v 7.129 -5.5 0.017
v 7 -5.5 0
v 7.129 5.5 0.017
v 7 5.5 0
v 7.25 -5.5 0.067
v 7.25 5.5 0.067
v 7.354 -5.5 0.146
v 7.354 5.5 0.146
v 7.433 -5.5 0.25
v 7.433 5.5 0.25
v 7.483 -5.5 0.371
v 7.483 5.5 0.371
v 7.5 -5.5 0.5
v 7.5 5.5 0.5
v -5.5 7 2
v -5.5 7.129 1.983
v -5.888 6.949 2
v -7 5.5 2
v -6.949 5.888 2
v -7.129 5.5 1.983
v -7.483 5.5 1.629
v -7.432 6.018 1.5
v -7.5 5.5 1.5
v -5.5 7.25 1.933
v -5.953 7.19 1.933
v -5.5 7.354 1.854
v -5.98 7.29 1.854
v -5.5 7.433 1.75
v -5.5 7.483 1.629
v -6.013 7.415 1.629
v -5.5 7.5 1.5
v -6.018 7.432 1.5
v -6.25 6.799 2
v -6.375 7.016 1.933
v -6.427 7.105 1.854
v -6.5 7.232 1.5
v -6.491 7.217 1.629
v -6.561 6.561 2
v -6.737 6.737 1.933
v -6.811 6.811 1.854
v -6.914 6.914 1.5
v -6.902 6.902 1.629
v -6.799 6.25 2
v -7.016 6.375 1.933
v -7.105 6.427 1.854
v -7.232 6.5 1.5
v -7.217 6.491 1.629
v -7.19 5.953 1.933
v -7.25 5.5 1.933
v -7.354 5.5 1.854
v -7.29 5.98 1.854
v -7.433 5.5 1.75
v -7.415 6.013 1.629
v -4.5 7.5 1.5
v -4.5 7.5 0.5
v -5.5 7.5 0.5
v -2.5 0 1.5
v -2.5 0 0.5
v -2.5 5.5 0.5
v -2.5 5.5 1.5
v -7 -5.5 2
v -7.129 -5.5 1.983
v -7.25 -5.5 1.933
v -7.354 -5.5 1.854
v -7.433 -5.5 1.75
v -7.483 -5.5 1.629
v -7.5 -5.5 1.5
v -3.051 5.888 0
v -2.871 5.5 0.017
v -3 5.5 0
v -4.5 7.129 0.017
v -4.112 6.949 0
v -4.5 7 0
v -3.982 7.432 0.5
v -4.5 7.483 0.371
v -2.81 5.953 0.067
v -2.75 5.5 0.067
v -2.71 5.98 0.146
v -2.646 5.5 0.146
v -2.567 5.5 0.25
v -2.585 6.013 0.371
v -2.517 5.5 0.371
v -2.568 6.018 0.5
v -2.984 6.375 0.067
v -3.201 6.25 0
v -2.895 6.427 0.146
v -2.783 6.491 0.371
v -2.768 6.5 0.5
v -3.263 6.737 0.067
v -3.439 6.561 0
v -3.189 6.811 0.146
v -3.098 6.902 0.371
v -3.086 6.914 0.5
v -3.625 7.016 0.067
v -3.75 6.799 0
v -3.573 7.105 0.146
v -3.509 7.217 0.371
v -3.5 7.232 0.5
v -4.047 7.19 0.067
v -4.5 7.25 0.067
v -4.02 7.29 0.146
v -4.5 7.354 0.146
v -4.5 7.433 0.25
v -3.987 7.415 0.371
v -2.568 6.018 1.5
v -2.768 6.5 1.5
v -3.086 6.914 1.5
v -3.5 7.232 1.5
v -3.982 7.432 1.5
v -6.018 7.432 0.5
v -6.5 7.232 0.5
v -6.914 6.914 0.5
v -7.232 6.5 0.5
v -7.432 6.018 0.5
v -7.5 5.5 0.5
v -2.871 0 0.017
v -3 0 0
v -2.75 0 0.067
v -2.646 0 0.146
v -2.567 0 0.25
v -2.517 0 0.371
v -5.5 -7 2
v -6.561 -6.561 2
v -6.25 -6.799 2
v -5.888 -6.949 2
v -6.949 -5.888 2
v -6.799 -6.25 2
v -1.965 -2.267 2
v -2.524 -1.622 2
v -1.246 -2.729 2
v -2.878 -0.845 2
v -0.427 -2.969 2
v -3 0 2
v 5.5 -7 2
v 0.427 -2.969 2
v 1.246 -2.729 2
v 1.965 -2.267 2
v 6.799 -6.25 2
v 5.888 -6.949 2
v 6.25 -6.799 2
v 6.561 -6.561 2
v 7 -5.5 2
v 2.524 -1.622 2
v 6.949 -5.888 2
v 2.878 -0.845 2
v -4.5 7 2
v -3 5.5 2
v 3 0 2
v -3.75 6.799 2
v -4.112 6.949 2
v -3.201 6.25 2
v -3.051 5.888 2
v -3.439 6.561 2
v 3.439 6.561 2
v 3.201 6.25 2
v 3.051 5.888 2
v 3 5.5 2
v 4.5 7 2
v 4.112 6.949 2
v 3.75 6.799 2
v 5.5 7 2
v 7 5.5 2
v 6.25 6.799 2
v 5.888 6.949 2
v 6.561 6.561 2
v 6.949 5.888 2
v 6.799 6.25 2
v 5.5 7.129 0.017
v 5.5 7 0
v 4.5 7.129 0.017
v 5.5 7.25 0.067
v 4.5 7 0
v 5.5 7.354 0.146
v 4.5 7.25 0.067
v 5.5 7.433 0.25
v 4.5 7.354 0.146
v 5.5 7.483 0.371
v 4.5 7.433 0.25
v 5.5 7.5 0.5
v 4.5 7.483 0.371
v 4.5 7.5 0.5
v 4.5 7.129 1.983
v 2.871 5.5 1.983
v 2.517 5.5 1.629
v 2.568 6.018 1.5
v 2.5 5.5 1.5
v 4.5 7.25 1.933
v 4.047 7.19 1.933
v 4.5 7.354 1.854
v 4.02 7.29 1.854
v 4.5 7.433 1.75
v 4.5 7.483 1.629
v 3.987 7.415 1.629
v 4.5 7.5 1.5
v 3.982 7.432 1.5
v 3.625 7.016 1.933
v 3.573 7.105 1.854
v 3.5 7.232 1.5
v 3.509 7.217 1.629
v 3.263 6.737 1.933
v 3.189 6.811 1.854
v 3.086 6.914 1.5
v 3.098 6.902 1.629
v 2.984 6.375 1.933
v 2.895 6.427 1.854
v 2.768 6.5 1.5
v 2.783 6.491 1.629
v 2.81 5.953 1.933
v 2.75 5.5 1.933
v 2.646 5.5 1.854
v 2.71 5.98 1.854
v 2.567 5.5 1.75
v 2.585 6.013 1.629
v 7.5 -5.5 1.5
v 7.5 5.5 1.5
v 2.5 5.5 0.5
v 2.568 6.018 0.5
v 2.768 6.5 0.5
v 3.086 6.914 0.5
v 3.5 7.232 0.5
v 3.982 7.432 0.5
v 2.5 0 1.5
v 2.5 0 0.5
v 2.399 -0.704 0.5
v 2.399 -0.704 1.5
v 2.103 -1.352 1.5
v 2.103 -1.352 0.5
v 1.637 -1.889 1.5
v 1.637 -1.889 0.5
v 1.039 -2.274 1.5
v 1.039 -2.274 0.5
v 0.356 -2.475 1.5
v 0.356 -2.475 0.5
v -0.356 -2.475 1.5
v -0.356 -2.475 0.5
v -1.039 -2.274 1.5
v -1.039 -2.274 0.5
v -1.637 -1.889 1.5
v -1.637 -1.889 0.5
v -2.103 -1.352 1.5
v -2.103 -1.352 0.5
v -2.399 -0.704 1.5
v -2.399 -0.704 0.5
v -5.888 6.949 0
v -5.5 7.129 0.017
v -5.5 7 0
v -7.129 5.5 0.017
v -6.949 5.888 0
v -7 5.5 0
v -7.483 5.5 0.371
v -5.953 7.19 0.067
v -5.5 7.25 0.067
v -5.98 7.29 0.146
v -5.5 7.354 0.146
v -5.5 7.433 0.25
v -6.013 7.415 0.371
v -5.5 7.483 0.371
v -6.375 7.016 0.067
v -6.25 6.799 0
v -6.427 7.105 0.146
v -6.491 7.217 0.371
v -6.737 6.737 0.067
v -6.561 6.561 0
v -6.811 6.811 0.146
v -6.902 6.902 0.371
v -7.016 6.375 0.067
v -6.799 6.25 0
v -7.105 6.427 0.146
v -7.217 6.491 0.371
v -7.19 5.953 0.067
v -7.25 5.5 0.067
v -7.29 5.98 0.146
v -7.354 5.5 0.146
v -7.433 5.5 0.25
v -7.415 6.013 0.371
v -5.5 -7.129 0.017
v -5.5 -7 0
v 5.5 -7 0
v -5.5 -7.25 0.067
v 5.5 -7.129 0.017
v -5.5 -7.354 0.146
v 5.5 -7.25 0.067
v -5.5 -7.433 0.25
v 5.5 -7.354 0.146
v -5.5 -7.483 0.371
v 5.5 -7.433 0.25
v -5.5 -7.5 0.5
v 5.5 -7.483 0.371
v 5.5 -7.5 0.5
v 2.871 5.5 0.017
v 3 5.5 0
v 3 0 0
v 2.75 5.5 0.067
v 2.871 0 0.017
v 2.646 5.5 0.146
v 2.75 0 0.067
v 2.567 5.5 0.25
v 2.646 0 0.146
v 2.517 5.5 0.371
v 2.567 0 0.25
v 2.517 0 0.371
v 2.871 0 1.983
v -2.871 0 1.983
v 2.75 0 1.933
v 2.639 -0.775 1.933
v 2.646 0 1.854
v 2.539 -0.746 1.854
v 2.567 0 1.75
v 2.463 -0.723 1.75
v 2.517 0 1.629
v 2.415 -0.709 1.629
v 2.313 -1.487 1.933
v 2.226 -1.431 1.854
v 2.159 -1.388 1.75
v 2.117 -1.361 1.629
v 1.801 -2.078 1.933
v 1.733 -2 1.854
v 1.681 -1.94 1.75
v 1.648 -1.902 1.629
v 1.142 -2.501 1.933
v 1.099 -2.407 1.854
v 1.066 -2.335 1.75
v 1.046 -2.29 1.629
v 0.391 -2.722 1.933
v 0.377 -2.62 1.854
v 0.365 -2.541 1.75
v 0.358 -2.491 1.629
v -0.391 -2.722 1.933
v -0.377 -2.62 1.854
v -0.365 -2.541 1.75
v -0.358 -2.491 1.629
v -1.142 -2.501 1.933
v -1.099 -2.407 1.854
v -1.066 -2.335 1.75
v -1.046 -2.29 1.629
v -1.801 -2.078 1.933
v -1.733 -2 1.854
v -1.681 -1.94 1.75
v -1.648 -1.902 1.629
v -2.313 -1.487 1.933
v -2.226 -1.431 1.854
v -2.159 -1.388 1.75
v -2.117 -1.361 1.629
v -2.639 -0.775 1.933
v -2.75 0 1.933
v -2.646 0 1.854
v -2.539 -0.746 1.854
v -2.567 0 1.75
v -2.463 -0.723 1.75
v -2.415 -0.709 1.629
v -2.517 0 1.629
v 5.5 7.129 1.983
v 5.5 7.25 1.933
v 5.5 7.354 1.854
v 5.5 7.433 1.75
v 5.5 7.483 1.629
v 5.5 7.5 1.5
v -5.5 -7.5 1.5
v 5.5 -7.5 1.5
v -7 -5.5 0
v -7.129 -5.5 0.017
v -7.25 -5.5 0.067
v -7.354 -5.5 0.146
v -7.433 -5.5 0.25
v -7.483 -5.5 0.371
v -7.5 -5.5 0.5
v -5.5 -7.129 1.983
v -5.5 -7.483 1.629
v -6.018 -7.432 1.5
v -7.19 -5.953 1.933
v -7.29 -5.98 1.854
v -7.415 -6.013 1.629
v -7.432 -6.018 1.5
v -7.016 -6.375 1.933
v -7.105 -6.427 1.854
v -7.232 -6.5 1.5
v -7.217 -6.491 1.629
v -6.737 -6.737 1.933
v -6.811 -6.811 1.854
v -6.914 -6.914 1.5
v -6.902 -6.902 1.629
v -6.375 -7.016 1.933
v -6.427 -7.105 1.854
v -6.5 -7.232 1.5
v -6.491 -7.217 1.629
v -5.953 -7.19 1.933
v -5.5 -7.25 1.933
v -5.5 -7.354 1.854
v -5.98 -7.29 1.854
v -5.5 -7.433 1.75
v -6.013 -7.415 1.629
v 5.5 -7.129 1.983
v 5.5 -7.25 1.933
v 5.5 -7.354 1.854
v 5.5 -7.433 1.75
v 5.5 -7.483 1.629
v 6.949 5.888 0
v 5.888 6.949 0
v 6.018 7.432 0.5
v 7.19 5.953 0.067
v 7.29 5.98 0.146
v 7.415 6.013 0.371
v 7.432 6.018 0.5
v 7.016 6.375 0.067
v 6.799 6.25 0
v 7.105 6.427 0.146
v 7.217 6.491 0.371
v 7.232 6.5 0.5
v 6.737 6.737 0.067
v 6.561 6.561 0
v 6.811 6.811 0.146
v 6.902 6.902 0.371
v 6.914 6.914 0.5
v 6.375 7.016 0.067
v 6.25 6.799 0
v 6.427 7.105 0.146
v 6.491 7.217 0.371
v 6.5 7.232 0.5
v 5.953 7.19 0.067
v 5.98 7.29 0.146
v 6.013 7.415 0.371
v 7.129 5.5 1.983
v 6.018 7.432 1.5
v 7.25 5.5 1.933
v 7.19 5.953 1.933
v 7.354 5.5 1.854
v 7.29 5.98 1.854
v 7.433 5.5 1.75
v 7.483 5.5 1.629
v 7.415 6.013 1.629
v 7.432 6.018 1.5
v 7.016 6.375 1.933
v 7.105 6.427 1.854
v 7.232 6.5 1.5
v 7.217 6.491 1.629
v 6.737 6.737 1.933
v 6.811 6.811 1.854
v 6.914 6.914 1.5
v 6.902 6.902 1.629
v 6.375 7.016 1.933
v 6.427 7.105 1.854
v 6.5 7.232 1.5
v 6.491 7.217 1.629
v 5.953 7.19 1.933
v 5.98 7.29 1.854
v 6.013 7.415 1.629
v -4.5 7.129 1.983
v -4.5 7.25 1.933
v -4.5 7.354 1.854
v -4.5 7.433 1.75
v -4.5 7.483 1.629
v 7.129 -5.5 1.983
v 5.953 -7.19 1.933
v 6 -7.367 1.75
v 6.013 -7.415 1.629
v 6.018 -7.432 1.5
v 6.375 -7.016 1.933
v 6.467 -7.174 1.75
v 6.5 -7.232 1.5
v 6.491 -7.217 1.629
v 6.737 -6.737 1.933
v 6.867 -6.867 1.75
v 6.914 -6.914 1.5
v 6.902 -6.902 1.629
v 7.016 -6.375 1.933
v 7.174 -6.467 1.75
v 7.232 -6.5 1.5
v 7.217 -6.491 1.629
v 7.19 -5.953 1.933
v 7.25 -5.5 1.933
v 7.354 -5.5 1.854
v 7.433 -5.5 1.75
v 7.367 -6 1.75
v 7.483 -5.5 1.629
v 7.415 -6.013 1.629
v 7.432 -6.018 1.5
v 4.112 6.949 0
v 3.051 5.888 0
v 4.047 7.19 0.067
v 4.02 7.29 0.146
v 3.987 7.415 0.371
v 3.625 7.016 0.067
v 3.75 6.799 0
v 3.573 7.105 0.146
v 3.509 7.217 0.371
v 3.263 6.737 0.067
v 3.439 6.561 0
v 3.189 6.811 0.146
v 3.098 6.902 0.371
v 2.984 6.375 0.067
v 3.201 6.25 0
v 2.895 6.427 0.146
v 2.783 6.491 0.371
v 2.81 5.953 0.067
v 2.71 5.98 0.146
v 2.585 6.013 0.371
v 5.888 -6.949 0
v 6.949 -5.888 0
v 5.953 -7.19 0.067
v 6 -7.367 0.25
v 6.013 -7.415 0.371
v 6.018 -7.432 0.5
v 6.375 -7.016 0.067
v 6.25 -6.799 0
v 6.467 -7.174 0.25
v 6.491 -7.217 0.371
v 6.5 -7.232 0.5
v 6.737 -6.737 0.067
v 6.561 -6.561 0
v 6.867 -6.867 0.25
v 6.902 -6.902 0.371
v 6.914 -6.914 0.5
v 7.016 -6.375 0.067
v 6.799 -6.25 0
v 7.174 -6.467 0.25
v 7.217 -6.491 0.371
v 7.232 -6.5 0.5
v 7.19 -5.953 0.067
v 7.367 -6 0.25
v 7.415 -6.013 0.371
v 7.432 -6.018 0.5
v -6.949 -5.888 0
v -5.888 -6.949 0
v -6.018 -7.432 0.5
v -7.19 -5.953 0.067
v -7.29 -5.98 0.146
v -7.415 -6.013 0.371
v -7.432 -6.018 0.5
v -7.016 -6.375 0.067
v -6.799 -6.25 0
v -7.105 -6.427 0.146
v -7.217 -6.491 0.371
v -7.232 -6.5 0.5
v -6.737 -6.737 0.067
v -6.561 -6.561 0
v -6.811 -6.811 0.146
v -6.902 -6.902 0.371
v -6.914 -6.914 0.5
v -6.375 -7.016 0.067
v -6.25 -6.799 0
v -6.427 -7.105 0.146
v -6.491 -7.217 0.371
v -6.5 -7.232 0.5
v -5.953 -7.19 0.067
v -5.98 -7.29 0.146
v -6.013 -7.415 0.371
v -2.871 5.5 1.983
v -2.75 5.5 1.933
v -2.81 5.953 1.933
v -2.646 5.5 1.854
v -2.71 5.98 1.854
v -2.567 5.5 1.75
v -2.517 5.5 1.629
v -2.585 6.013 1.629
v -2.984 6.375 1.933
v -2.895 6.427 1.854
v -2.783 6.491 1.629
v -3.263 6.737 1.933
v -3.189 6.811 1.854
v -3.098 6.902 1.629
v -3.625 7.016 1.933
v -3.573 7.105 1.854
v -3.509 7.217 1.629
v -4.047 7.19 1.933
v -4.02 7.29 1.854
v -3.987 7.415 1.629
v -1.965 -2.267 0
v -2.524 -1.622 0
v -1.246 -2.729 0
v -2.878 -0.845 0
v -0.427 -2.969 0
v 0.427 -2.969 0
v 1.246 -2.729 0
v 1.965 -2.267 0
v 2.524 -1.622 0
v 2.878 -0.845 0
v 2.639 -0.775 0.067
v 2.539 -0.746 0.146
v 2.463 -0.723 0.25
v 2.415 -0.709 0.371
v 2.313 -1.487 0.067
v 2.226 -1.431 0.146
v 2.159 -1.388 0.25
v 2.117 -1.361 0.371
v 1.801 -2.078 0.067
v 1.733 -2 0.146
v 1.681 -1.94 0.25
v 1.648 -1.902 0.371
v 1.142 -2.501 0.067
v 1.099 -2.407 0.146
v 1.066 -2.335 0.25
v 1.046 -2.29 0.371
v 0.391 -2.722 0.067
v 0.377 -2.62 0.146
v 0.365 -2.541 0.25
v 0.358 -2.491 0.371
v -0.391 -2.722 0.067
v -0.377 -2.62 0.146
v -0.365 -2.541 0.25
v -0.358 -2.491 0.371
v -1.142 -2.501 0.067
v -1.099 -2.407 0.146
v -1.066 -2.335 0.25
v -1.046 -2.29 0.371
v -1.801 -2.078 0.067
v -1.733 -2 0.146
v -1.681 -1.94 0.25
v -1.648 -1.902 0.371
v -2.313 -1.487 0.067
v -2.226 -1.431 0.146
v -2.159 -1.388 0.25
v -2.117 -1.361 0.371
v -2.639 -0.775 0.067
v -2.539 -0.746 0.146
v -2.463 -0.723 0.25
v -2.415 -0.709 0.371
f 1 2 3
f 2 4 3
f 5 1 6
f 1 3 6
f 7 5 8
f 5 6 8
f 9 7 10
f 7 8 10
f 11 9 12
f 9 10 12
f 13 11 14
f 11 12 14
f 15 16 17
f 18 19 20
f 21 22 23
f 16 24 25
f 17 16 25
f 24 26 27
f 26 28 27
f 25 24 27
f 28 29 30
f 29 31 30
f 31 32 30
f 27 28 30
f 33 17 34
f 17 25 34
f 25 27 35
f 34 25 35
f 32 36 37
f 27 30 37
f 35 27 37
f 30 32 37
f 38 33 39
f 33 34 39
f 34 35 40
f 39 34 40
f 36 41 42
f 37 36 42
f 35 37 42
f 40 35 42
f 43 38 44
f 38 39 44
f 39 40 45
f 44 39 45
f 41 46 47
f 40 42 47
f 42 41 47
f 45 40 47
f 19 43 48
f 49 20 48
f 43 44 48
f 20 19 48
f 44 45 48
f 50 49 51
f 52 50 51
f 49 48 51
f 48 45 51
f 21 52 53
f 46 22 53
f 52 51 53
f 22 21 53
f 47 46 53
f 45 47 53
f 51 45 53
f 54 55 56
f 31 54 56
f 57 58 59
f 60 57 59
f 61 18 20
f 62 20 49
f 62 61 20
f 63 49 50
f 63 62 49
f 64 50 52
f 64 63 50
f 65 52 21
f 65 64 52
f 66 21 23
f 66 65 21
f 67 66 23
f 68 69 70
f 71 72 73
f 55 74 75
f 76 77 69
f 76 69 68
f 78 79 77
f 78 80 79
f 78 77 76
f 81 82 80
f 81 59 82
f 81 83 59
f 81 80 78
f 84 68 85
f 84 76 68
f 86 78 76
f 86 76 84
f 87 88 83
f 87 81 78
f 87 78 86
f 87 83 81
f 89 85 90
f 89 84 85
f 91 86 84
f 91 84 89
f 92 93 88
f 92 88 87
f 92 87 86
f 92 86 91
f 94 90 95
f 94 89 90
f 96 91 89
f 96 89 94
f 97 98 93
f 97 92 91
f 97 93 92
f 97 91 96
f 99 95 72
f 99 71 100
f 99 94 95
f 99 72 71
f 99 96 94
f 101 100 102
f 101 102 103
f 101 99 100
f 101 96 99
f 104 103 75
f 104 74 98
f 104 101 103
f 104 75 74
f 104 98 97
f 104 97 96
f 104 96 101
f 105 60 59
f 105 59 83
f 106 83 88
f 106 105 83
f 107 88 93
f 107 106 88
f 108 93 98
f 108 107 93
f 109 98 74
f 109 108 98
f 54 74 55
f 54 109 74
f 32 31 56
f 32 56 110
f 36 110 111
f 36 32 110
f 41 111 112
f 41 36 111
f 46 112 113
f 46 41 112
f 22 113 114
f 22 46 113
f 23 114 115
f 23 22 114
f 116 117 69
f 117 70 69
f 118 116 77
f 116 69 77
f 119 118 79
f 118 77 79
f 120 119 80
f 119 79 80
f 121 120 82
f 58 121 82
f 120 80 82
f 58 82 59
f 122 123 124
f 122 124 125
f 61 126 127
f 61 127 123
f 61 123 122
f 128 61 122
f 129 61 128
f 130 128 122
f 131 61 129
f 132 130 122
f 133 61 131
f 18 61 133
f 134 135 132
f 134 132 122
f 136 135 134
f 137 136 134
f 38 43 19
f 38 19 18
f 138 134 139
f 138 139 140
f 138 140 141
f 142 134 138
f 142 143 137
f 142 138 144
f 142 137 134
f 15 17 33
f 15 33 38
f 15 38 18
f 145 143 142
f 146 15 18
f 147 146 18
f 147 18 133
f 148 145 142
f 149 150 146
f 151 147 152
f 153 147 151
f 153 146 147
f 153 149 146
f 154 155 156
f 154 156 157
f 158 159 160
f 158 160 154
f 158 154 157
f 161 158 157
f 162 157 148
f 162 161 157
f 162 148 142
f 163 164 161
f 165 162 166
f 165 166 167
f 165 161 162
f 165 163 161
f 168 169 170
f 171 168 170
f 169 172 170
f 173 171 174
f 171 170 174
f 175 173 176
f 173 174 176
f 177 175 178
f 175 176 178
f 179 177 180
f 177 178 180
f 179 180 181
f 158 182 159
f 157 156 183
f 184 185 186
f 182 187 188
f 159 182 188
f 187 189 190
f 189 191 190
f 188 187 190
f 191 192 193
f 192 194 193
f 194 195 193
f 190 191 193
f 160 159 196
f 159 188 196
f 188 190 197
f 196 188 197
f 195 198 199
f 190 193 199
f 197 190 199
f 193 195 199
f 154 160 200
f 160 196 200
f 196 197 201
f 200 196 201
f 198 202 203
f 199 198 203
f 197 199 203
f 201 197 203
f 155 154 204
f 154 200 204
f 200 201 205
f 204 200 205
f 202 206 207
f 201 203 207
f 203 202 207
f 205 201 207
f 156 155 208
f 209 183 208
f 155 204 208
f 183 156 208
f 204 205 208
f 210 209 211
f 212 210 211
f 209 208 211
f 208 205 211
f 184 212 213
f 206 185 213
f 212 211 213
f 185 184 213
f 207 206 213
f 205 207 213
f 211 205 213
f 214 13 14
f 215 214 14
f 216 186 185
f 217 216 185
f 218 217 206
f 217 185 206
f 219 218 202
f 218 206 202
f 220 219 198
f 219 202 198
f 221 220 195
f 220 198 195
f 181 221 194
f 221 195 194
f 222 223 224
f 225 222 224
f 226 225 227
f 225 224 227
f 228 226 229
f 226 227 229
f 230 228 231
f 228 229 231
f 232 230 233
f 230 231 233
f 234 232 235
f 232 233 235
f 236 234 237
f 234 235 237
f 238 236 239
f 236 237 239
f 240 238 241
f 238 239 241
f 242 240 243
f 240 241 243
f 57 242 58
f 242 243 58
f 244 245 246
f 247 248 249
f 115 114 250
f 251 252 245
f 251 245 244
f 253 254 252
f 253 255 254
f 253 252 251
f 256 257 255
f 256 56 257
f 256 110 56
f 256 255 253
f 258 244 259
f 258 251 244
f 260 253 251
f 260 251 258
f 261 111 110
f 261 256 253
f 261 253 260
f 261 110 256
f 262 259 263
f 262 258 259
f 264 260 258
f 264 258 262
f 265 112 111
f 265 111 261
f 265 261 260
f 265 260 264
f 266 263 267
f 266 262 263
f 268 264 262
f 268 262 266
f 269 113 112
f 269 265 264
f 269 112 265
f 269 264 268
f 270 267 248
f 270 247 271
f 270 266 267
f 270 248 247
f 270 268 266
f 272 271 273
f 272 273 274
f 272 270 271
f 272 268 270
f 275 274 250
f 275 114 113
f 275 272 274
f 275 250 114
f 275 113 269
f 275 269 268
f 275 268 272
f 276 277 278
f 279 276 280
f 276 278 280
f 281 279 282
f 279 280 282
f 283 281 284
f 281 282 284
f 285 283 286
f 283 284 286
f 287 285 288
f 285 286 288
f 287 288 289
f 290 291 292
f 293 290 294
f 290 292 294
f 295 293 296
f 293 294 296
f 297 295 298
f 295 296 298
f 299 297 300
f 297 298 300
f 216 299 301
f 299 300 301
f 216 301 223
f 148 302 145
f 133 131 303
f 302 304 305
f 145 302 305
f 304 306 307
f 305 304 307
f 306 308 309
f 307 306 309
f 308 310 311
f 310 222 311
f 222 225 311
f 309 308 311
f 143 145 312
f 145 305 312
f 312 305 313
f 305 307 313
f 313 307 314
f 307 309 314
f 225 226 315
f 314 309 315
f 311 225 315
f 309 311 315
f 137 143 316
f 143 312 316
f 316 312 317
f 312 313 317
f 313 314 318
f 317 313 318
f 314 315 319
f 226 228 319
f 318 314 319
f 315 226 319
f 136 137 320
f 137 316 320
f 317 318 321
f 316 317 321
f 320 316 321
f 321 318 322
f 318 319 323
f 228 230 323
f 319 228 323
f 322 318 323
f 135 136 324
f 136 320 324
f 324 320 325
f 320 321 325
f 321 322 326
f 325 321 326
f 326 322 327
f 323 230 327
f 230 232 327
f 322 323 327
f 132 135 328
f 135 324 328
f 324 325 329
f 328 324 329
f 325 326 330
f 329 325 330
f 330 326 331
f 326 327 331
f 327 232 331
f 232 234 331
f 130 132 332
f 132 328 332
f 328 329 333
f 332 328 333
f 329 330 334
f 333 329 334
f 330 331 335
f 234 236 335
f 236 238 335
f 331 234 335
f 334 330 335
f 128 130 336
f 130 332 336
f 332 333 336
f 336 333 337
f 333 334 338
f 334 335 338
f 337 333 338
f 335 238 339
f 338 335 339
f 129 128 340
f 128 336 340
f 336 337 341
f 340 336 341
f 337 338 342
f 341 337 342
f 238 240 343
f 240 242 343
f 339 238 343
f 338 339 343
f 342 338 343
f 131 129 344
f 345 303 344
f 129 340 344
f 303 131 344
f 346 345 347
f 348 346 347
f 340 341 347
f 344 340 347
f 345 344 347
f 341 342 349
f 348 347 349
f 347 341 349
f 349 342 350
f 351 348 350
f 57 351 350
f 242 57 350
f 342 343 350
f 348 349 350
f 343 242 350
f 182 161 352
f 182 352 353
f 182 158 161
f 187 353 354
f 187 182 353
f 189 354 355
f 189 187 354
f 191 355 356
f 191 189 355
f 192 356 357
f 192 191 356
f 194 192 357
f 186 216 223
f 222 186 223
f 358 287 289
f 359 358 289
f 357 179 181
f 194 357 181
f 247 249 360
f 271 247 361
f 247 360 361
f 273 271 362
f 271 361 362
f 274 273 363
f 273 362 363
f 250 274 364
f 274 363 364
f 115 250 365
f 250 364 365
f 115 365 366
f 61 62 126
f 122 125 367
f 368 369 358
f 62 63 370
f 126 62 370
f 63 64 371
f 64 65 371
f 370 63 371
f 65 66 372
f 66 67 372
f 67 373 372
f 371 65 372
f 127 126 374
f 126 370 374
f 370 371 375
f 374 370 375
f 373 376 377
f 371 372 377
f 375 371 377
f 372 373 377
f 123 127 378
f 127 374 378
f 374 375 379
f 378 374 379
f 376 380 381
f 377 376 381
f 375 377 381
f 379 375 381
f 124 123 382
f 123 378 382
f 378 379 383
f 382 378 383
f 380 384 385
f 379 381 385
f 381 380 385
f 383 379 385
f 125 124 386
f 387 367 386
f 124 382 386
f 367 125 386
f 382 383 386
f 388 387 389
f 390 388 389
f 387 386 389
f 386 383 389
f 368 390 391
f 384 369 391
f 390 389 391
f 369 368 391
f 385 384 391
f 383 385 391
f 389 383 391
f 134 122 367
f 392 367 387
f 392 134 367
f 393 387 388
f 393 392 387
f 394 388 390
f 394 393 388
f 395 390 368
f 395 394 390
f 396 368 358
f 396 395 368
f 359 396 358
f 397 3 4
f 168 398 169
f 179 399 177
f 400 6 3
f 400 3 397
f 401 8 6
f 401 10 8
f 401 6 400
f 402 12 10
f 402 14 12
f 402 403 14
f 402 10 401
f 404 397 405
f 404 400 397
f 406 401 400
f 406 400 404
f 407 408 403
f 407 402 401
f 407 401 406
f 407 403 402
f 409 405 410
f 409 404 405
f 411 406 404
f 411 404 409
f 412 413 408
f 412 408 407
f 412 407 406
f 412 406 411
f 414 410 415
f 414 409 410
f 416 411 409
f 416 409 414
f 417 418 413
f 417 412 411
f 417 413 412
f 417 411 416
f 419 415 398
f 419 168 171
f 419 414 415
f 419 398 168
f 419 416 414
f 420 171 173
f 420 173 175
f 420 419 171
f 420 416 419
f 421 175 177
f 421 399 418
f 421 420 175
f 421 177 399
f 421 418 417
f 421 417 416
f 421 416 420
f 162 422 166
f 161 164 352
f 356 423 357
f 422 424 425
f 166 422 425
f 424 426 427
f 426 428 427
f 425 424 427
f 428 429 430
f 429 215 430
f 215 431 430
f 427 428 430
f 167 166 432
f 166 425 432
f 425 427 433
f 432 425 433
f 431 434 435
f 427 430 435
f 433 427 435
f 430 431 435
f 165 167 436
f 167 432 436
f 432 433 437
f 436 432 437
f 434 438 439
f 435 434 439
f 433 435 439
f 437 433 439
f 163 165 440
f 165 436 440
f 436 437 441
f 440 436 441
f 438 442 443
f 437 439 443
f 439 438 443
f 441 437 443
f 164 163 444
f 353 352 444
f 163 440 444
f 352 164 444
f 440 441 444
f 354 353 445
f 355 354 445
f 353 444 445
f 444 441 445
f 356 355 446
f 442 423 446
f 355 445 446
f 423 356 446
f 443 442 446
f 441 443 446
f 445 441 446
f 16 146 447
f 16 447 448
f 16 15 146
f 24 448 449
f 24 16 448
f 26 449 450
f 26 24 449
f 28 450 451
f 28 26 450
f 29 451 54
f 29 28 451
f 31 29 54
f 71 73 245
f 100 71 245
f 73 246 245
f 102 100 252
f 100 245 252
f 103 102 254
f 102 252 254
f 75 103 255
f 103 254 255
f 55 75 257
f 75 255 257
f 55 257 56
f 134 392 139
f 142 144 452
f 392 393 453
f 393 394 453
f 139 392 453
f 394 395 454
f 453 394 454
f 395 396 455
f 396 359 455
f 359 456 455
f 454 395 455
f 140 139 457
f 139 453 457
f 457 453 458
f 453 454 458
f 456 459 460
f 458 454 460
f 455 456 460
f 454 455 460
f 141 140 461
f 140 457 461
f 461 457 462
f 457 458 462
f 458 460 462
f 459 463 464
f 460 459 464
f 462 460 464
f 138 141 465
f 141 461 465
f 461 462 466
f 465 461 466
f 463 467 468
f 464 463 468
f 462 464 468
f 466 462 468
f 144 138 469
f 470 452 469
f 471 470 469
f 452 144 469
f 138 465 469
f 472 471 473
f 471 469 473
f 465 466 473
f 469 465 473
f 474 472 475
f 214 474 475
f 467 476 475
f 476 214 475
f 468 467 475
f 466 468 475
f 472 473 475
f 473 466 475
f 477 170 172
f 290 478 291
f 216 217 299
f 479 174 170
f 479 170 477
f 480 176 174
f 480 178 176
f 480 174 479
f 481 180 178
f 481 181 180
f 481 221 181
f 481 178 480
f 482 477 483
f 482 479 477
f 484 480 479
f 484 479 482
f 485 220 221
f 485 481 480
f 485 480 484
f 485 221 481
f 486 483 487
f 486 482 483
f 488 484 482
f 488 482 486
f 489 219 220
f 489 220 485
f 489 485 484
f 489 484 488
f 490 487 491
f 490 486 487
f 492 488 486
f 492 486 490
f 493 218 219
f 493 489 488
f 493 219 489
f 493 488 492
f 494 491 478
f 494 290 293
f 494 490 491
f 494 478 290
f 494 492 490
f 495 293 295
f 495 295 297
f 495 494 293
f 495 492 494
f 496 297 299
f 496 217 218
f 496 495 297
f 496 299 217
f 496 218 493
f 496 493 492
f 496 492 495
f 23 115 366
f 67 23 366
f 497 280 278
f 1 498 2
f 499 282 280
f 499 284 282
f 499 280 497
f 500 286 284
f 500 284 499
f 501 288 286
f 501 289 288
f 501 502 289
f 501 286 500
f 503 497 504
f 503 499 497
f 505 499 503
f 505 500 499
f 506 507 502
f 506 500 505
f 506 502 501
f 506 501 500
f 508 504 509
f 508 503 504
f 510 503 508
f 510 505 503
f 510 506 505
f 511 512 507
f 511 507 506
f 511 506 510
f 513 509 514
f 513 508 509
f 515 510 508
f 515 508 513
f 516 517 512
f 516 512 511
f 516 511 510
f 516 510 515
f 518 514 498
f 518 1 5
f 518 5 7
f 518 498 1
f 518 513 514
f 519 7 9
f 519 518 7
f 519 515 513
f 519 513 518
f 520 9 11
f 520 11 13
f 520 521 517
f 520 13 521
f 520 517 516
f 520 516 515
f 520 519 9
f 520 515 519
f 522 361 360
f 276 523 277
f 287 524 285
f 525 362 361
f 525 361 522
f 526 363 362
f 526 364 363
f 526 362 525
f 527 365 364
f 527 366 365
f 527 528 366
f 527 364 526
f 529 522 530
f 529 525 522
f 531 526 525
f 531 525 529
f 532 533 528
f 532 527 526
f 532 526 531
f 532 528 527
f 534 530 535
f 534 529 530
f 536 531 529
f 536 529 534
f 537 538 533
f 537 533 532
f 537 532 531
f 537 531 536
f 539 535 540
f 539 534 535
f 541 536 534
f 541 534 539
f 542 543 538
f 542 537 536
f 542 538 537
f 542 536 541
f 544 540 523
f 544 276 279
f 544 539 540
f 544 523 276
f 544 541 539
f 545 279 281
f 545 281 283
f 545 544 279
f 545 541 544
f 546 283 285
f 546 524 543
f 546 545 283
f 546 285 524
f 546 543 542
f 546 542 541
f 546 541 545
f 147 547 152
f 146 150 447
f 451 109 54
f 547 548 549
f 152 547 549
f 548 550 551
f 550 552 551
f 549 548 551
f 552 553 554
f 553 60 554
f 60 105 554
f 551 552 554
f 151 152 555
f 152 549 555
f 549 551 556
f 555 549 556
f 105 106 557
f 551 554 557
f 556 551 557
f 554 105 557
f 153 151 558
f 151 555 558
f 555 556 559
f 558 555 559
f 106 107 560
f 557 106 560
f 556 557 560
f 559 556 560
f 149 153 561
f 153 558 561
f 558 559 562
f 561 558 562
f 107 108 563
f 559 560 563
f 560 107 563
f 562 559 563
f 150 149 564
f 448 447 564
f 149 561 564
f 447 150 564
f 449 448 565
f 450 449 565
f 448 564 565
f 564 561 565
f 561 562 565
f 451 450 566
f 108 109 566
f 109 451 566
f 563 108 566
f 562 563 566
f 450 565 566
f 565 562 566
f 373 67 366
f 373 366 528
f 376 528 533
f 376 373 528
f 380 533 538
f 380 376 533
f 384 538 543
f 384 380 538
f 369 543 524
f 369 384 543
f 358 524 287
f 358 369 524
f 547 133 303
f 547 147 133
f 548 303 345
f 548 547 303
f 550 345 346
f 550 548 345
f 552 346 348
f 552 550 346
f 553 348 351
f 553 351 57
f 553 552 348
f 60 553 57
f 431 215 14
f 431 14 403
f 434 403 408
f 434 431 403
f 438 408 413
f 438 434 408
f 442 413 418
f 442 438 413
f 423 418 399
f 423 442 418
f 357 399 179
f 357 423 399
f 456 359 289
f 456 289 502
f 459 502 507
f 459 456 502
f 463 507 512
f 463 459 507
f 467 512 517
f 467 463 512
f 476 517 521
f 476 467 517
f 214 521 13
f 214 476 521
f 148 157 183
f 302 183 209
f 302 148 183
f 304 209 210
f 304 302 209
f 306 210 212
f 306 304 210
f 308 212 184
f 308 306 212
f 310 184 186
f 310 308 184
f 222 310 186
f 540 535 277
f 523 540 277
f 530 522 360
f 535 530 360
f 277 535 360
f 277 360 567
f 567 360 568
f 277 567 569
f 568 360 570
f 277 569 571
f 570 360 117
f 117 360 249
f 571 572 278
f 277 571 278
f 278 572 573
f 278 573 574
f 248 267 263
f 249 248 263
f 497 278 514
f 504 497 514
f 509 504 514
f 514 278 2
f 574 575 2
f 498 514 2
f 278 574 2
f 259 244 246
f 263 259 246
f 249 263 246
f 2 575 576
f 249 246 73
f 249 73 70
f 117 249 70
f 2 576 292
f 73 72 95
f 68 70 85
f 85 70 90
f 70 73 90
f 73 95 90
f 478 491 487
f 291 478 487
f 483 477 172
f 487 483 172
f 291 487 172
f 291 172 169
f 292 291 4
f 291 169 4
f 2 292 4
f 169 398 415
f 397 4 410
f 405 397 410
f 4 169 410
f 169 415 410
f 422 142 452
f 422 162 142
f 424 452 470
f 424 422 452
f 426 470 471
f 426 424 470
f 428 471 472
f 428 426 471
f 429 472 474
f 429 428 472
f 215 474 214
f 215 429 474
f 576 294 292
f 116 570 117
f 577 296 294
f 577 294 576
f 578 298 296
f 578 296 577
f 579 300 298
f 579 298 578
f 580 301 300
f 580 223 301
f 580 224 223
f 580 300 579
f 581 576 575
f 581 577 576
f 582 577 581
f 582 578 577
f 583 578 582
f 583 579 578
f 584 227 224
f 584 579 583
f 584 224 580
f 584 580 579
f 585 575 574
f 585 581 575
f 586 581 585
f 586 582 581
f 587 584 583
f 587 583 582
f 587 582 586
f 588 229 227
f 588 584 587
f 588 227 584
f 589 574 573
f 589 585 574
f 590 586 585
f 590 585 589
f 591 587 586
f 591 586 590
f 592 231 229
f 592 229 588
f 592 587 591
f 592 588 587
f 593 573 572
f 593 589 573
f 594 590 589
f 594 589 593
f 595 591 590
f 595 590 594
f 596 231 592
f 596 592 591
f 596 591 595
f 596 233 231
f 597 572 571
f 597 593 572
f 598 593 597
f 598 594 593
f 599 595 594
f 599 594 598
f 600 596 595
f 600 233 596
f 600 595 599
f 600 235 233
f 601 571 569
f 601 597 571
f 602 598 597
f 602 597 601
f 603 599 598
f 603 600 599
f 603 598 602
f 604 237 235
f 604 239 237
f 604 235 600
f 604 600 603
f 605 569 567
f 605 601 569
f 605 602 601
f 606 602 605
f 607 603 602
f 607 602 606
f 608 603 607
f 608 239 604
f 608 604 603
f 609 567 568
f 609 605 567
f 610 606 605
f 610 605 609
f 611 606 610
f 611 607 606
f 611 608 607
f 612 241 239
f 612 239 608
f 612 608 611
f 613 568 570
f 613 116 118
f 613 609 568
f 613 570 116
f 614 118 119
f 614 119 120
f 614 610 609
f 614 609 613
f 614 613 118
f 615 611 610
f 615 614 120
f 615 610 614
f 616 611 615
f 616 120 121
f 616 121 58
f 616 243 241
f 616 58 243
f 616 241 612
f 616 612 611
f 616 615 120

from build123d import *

# Parameters (mm, degrees)
F1_DEPTH = 2
F2_R     = 2
F3_R     = 0.5


with BuildPart() as f1:
    # F0 (on Top) → F1 (new body)
    with BuildSketch(Plane.XY):
        with BuildLine():
            Line((2.5, 7.5), (2.5, 0))
            ThreePointArc((2.5, 0), (0, -2.5), (-2.5, 0))
            Line((-2.5, 0), (-2.5, 7.5))
            Line((-2.5, 7.5), (-7.5, 7.5))
            Line((-7.5, 7.5), (-7.5, -7.5))
            Line((-7.5, -7.5), (7.5, -7.5))
            Line((7.5, -7.5), (7.5, 7.5))
            Line((7.5, 7.5), (2.5, 7.5))
        make_face()
    extrude(amount=F1_DEPTH)

    # F2
    f2_edges = [f1.edges().sort_by_distance(p)[0] for p in [
        (7.5, -7.5, 1),
        (-7.5, -7.5, 1),
        (7.5, 7.5, 1),
        (2.5, 7.5, 1),
        (-2.5, 7.5, 1),
        (-7.5, 7.5, 1),
    ]]
    fillet(f2_edges, radius=F2_R)

    # F3
    f3_edges = [f1.edges().sort_by_distance(p)[0] for p in [
        (7.5, 0, 2),
        (6.914214, -6.914214, 2),
        (6.914214, 6.914214, 2),
        (0, -7.5, 2),
        (5, 7.5, 2),
        (-6.914214, -6.914214, 2),
        (3.085786, 6.914214, 2),
        (-7.5, 0, 2),
        (2.5, 2.75, 2),
        (-6.914214, 6.914214, 2),
        (0, -2.5, 2),
        (-5, 7.5, 2),
        (-2.5, 2.75, 2),
        (-3.085786, 6.914214, 2),
        (7.5, 0, 0),
        (6.914214, -6.914214, 0),
        (6.914214, 6.914214, 0),
        (0, -7.5, 0),
        (5, 7.5, 0),
        (-6.914214, -6.914214, 0),
        (3.085786, 6.914214, 0),
        (-7.5, 0, 0),
        (2.5, 2.75, 0),
        (-6.914214, 6.914214, 0),
        (0, -2.5, 0),
        (-5, 7.5, 0),
        (-2.5, 2.75, 0),
        (-3.085786, 6.914214, 0),
    ]]
    fillet(f3_edges, radius=F3_R)


solid = f1.part
